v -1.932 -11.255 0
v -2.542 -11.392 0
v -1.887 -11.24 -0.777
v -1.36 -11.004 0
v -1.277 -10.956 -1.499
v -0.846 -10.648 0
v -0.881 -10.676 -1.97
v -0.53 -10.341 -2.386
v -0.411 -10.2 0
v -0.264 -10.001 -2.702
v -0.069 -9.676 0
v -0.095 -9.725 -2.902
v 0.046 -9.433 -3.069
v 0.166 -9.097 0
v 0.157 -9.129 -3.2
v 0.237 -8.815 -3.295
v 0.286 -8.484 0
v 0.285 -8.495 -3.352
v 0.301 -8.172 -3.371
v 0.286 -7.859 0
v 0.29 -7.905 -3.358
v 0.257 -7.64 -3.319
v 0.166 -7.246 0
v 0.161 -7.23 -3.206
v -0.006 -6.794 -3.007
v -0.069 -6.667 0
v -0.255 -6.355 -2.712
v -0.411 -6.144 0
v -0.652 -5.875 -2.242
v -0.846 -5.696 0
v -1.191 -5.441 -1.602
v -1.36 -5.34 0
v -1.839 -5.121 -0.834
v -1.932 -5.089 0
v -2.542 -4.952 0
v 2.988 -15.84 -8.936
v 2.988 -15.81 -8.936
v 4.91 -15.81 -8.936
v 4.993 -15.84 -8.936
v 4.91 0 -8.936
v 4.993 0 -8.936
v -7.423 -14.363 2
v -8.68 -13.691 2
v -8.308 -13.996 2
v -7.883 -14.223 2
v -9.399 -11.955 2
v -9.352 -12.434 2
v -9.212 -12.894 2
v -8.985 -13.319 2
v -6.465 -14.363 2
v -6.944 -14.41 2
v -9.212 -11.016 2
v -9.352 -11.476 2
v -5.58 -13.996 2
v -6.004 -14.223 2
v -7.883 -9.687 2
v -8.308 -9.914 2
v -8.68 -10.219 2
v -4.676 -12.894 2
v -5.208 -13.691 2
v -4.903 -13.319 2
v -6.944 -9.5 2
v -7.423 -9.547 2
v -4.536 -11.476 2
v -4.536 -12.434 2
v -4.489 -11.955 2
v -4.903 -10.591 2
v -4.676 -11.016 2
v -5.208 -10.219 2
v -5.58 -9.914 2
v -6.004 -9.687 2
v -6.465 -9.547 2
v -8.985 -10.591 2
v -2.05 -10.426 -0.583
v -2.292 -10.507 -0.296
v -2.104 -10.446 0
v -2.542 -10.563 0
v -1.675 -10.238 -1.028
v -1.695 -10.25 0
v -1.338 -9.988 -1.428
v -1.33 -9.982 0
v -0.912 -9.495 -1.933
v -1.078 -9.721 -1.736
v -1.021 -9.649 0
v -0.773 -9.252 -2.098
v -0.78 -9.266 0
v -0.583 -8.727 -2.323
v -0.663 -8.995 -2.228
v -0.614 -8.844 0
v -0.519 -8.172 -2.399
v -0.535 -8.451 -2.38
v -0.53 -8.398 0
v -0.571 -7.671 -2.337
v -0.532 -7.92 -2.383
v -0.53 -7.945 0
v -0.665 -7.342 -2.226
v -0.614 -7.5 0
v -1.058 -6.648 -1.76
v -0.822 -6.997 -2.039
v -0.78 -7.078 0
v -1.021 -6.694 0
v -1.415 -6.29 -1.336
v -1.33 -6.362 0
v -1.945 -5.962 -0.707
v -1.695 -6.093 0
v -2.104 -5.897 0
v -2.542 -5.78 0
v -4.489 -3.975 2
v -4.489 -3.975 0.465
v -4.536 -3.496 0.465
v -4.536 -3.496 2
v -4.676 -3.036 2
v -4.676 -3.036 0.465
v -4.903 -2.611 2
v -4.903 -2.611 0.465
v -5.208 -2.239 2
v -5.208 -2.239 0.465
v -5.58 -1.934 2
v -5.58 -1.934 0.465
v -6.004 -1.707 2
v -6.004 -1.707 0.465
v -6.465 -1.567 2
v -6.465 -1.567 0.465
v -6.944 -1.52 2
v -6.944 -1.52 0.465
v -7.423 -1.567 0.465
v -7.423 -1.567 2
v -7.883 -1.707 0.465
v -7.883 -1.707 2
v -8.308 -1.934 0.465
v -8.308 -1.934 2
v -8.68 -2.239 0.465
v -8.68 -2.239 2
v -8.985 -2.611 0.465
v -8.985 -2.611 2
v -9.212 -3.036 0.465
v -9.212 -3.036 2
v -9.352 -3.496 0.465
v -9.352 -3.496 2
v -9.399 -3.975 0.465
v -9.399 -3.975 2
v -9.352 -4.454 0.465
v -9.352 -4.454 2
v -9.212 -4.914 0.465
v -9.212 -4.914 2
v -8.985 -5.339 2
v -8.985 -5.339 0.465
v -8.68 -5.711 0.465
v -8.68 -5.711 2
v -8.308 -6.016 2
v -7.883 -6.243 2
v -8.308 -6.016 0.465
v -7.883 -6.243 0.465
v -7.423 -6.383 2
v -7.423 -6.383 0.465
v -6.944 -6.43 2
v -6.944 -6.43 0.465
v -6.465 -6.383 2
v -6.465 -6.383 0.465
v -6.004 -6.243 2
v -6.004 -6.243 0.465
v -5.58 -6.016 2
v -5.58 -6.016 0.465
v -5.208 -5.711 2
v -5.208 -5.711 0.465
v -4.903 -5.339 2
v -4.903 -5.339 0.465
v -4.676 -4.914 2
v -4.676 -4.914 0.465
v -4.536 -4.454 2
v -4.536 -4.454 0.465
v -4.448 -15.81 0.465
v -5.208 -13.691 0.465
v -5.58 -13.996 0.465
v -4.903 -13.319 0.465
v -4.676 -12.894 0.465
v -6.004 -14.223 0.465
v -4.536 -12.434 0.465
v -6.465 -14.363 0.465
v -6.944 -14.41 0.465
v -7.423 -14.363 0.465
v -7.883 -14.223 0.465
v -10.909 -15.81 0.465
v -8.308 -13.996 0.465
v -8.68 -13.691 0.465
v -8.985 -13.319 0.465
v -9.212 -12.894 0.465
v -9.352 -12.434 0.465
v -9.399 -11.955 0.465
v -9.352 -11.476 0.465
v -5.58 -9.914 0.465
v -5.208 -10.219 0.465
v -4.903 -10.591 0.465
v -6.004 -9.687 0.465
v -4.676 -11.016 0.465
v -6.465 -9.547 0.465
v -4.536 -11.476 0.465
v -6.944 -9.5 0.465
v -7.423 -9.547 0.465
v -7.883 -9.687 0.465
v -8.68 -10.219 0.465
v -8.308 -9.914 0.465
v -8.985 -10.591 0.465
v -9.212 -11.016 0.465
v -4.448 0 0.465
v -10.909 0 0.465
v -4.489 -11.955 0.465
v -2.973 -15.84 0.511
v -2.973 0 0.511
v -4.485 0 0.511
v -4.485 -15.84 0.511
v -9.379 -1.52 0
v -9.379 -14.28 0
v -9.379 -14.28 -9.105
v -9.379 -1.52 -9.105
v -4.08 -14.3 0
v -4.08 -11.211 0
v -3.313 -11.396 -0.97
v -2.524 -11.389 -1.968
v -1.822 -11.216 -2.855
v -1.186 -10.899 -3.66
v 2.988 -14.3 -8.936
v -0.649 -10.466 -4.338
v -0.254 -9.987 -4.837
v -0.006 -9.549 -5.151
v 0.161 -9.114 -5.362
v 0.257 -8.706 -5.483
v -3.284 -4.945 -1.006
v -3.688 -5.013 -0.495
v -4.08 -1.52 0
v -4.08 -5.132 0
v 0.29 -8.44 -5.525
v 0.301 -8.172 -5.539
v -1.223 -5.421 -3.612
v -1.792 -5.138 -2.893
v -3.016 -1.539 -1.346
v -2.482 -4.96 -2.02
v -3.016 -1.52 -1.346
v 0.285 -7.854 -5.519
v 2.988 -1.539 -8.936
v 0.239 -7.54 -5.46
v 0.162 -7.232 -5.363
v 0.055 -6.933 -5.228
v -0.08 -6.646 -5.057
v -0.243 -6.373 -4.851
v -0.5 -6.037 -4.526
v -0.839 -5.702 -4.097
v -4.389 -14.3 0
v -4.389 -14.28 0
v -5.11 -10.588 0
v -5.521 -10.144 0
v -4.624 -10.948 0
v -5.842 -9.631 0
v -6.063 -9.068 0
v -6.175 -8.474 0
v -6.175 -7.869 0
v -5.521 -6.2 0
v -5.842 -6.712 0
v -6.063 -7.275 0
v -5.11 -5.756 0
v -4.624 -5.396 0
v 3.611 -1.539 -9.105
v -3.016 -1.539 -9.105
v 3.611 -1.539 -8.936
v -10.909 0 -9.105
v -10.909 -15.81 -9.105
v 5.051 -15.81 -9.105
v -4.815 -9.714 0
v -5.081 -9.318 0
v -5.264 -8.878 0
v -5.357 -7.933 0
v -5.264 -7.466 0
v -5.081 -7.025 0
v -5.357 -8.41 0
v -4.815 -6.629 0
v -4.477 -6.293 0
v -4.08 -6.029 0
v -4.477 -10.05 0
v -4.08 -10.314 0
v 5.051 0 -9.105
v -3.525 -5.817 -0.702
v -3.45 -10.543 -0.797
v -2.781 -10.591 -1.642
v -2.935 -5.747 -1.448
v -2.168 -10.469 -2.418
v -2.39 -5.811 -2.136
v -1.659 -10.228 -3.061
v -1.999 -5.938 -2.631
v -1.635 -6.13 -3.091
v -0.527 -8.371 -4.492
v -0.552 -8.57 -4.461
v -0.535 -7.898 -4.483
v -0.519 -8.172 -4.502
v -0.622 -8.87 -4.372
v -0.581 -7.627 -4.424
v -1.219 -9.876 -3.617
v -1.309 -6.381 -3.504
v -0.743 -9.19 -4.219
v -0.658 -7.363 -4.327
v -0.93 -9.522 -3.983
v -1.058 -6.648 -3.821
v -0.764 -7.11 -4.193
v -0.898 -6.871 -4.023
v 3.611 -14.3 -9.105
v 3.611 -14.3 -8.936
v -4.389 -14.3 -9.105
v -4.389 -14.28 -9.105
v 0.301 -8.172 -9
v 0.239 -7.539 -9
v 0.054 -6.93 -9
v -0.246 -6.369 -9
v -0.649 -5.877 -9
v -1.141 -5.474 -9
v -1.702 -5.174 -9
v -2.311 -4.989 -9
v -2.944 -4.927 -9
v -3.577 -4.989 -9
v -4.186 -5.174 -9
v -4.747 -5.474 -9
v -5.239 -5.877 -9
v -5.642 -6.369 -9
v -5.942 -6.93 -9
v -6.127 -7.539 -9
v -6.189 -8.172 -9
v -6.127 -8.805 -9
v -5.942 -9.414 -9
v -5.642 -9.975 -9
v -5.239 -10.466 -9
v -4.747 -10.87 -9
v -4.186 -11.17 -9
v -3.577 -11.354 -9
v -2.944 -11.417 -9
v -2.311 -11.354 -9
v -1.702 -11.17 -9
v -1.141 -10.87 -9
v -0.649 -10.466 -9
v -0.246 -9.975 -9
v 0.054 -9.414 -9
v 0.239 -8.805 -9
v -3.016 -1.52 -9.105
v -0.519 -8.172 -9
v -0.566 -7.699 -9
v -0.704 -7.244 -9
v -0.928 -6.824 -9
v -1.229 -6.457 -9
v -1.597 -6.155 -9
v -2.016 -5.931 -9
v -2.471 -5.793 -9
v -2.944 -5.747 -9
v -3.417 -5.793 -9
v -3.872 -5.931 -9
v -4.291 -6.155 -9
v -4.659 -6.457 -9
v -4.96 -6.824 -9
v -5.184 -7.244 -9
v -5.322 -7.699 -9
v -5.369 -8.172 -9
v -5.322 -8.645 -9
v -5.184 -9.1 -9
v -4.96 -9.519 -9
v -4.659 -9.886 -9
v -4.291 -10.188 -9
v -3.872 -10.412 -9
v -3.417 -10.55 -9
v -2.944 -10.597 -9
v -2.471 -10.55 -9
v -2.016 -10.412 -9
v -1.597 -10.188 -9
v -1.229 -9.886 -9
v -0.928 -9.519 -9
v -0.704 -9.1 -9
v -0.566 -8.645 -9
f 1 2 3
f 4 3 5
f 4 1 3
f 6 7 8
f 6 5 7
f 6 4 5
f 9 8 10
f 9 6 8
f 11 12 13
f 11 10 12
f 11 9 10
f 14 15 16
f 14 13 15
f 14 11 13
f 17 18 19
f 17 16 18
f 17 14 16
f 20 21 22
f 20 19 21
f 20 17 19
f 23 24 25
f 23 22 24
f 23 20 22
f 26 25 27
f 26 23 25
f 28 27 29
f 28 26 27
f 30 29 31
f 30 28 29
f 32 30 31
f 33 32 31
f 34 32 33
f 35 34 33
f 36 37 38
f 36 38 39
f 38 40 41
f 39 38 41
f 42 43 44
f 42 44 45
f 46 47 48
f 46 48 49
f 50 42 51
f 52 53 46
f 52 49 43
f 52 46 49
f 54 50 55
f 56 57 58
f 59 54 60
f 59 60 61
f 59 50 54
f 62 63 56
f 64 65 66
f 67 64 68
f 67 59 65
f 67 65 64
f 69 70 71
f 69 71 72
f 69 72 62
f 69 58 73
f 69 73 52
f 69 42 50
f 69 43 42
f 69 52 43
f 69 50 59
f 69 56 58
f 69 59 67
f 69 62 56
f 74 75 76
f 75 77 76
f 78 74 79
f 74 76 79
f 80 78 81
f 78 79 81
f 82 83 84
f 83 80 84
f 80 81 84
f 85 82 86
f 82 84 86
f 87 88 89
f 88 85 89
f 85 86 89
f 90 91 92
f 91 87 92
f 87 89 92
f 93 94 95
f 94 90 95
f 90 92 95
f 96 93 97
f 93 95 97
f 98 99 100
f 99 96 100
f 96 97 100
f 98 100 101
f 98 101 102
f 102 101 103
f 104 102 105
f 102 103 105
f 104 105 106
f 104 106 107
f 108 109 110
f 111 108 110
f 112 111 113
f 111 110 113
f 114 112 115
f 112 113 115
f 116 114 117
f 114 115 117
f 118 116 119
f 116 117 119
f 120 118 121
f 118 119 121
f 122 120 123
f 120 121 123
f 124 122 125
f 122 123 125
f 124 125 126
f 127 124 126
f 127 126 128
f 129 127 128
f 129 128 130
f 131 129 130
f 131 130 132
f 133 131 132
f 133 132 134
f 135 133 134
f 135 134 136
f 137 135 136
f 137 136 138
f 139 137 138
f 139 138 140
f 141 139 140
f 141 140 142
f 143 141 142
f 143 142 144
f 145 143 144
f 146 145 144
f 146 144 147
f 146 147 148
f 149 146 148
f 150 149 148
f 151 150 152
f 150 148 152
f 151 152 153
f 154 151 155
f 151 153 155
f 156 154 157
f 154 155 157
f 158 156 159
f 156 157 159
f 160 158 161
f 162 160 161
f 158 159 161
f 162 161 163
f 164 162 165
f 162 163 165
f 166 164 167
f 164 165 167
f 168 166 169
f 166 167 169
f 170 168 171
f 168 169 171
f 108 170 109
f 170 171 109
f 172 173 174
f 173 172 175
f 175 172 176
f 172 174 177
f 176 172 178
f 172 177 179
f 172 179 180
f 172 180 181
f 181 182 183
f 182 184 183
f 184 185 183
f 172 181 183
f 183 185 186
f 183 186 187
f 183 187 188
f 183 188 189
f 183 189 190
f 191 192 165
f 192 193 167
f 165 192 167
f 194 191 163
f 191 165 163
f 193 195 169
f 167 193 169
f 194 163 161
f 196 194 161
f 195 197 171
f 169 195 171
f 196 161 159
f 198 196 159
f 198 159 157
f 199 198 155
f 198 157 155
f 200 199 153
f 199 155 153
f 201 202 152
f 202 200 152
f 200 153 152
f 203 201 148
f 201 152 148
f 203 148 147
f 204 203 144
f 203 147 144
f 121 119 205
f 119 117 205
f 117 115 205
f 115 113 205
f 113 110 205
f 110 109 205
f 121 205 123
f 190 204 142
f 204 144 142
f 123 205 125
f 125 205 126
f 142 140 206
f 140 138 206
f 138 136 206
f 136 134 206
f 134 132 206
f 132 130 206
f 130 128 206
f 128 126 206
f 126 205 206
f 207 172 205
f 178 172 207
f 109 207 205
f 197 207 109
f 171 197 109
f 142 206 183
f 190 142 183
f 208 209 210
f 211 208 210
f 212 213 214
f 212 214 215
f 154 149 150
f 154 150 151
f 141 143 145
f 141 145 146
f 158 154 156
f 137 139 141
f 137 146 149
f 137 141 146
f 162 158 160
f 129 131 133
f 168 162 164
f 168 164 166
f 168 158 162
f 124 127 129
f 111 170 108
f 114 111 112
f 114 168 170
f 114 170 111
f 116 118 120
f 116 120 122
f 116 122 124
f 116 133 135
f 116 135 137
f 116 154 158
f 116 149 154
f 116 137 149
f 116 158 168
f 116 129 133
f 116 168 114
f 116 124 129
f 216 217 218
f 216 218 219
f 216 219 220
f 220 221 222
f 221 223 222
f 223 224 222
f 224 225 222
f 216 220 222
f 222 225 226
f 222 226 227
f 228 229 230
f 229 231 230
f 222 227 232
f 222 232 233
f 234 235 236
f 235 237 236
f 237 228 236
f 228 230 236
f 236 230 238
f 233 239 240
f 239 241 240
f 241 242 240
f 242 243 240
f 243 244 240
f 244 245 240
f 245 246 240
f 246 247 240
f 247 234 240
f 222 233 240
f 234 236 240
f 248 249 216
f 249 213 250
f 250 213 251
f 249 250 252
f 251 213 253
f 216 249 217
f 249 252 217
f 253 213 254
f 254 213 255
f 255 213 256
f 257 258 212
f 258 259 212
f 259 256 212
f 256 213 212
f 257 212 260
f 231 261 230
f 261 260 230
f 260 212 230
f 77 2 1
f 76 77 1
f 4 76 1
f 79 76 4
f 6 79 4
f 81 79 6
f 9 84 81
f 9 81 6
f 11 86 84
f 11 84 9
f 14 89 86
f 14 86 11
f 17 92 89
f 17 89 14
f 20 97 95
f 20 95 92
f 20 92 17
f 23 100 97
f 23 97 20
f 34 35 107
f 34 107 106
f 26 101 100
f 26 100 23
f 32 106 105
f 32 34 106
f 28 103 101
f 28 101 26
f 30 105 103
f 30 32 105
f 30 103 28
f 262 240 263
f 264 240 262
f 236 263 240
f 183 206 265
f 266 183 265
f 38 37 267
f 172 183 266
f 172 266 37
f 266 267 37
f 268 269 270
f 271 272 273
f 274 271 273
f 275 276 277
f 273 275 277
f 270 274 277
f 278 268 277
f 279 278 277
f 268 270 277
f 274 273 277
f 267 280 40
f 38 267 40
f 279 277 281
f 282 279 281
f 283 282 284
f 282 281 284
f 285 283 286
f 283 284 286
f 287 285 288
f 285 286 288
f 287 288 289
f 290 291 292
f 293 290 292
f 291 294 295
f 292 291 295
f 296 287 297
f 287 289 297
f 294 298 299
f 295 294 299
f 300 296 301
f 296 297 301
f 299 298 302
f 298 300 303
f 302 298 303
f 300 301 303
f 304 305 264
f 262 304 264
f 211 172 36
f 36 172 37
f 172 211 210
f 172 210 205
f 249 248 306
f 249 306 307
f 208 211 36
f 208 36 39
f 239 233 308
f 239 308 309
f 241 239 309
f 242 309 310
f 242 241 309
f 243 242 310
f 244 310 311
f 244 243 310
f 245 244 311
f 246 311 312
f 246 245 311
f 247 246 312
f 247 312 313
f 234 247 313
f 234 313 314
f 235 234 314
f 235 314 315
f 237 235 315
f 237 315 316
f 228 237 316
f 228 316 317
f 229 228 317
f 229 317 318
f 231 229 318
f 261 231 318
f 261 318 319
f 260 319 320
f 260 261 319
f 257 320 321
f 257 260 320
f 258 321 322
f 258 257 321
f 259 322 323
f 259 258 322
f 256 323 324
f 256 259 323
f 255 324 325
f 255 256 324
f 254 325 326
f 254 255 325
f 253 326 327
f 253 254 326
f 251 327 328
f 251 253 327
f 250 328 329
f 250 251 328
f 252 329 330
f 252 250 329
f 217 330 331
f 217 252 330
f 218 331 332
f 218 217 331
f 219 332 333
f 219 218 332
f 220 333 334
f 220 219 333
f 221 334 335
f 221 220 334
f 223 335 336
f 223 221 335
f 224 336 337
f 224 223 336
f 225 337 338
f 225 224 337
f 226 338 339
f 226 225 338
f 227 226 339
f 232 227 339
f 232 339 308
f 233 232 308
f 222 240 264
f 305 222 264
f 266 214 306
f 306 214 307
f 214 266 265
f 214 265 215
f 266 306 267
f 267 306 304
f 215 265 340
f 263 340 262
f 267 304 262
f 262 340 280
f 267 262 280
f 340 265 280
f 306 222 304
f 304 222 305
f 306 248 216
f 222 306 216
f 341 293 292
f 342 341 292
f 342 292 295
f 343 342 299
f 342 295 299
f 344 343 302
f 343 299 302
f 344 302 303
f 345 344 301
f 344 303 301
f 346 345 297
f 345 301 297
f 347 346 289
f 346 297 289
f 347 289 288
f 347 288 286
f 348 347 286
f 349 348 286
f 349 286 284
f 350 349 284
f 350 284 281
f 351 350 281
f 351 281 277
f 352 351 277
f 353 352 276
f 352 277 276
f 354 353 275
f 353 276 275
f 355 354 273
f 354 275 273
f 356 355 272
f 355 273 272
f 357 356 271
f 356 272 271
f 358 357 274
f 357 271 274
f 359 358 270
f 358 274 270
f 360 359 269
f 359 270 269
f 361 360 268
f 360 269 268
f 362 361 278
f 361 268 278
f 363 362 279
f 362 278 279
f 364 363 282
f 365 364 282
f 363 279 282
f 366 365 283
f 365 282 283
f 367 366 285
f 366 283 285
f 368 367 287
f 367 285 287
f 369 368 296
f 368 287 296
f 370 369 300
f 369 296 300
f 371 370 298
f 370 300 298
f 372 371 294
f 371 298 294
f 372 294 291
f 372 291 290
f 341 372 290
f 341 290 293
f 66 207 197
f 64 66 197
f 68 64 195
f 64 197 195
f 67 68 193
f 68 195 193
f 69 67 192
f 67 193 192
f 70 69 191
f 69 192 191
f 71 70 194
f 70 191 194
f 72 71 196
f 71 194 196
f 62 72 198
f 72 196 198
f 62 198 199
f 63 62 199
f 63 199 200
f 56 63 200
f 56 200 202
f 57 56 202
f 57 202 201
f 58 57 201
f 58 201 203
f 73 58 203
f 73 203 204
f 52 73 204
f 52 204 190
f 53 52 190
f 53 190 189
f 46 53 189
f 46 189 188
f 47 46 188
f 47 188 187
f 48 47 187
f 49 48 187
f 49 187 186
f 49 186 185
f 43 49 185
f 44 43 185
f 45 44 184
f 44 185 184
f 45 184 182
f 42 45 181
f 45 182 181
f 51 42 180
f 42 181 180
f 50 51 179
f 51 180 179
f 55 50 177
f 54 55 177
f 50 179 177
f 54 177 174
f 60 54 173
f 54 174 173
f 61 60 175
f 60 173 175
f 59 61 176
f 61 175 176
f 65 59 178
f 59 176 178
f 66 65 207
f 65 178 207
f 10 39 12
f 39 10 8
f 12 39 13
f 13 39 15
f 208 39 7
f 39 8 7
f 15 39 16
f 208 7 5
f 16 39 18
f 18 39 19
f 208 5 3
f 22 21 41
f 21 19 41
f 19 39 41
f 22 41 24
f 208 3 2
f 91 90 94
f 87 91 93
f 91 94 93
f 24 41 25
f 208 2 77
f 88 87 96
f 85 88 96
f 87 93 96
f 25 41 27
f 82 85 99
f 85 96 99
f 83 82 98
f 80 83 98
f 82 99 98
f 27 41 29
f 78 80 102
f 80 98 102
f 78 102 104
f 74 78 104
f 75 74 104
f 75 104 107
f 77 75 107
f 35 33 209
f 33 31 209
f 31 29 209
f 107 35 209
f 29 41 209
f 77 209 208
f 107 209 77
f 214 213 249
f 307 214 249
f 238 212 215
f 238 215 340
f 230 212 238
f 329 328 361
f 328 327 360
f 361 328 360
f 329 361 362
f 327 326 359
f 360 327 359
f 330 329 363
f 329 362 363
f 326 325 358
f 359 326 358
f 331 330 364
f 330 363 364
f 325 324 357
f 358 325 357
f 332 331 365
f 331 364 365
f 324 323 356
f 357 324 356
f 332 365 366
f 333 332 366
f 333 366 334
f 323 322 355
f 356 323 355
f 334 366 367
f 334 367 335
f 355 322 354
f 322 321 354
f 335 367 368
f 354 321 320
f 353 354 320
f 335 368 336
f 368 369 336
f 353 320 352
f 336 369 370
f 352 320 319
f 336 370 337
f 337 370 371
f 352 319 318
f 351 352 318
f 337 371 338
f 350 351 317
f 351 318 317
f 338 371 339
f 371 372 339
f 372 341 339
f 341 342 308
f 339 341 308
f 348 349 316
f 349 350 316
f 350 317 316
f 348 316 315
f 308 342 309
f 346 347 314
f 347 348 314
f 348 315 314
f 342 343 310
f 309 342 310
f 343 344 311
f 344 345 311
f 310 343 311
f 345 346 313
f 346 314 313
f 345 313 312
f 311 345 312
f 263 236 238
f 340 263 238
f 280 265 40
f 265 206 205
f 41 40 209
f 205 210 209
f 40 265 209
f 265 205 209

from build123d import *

# Parameters (mm, degrees)
F1_DEPTH  = 15.81
F2_R      = 2.455
F3_DEPTH  = 2
F4_W      = 6.363237
F4_H      = 12.76
F5_DEPTH  = 10
F6_W      = 8
F6_H      = 12.760826
F7_DEPTH  = 10
F9_DEPTH  = 15.84
F10_R     = 3.245
F10_R_2   = 2.425
F11_DEPTH = 9


with BuildPart() as f1:
    # F0 (on Front) → F1 (new body)
    with BuildSketch(Plane.XZ):
        Polygon((-2.968959, 0.465274), (-10.908959, 0.465274), (-10.908959, -9.104726), (5.051041, -9.104726), align=None)
    extrude(amount=F1_DEPTH)

    # F2 (on Top) → F3 (join)
    with BuildSketch(Plane.XY):
        with Locations((-6.943959, -3.975)):
            Circle(F2_R)
        with Locations((-6.943959, -11.955)):
            Circle(F2_R)
    extrude(amount=F3_DEPTH)

    # F4 (on Top) → F5 (cut)
    with BuildSketch(Plane.XY):
        with Locations((-6.197341, -7.9)):
            Rectangle(F4_W, F4_H)
    extrude(amount=-F5_DEPTH, mode=Mode.SUBTRACT)

    # F6 (on Top) → F7 (cut)
    with BuildSketch(Plane.XY):
        with Locations((-0.388959, -7.919587)):
            Rectangle(F6_W, F6_H)
    extrude(amount=-F7_DEPTH, mode=Mode.SUBTRACT)

    # F8 (on Front) → F9 (join)
    with BuildSketch(Plane.XZ):
        Polygon((4.992922, -8.935911), (-2.972763, 0.511219), (-4.48452, 0.511219), (2.988079, -8.935911), align=None)
    extrude(amount=F9_DEPTH)

    # F10 (on Top) → F11 (join)
    with BuildSketch(Plane.XY):
        with Locations((-2.943959, -8.171717)):
            Circle(F10_R)
        with Locations((-2.943959, -8.171717)):
            Circle(F10_R_2, mode=Mode.SUBTRACT)
    extrude(amount=-F11_DEPTH)


solid = f1.part
